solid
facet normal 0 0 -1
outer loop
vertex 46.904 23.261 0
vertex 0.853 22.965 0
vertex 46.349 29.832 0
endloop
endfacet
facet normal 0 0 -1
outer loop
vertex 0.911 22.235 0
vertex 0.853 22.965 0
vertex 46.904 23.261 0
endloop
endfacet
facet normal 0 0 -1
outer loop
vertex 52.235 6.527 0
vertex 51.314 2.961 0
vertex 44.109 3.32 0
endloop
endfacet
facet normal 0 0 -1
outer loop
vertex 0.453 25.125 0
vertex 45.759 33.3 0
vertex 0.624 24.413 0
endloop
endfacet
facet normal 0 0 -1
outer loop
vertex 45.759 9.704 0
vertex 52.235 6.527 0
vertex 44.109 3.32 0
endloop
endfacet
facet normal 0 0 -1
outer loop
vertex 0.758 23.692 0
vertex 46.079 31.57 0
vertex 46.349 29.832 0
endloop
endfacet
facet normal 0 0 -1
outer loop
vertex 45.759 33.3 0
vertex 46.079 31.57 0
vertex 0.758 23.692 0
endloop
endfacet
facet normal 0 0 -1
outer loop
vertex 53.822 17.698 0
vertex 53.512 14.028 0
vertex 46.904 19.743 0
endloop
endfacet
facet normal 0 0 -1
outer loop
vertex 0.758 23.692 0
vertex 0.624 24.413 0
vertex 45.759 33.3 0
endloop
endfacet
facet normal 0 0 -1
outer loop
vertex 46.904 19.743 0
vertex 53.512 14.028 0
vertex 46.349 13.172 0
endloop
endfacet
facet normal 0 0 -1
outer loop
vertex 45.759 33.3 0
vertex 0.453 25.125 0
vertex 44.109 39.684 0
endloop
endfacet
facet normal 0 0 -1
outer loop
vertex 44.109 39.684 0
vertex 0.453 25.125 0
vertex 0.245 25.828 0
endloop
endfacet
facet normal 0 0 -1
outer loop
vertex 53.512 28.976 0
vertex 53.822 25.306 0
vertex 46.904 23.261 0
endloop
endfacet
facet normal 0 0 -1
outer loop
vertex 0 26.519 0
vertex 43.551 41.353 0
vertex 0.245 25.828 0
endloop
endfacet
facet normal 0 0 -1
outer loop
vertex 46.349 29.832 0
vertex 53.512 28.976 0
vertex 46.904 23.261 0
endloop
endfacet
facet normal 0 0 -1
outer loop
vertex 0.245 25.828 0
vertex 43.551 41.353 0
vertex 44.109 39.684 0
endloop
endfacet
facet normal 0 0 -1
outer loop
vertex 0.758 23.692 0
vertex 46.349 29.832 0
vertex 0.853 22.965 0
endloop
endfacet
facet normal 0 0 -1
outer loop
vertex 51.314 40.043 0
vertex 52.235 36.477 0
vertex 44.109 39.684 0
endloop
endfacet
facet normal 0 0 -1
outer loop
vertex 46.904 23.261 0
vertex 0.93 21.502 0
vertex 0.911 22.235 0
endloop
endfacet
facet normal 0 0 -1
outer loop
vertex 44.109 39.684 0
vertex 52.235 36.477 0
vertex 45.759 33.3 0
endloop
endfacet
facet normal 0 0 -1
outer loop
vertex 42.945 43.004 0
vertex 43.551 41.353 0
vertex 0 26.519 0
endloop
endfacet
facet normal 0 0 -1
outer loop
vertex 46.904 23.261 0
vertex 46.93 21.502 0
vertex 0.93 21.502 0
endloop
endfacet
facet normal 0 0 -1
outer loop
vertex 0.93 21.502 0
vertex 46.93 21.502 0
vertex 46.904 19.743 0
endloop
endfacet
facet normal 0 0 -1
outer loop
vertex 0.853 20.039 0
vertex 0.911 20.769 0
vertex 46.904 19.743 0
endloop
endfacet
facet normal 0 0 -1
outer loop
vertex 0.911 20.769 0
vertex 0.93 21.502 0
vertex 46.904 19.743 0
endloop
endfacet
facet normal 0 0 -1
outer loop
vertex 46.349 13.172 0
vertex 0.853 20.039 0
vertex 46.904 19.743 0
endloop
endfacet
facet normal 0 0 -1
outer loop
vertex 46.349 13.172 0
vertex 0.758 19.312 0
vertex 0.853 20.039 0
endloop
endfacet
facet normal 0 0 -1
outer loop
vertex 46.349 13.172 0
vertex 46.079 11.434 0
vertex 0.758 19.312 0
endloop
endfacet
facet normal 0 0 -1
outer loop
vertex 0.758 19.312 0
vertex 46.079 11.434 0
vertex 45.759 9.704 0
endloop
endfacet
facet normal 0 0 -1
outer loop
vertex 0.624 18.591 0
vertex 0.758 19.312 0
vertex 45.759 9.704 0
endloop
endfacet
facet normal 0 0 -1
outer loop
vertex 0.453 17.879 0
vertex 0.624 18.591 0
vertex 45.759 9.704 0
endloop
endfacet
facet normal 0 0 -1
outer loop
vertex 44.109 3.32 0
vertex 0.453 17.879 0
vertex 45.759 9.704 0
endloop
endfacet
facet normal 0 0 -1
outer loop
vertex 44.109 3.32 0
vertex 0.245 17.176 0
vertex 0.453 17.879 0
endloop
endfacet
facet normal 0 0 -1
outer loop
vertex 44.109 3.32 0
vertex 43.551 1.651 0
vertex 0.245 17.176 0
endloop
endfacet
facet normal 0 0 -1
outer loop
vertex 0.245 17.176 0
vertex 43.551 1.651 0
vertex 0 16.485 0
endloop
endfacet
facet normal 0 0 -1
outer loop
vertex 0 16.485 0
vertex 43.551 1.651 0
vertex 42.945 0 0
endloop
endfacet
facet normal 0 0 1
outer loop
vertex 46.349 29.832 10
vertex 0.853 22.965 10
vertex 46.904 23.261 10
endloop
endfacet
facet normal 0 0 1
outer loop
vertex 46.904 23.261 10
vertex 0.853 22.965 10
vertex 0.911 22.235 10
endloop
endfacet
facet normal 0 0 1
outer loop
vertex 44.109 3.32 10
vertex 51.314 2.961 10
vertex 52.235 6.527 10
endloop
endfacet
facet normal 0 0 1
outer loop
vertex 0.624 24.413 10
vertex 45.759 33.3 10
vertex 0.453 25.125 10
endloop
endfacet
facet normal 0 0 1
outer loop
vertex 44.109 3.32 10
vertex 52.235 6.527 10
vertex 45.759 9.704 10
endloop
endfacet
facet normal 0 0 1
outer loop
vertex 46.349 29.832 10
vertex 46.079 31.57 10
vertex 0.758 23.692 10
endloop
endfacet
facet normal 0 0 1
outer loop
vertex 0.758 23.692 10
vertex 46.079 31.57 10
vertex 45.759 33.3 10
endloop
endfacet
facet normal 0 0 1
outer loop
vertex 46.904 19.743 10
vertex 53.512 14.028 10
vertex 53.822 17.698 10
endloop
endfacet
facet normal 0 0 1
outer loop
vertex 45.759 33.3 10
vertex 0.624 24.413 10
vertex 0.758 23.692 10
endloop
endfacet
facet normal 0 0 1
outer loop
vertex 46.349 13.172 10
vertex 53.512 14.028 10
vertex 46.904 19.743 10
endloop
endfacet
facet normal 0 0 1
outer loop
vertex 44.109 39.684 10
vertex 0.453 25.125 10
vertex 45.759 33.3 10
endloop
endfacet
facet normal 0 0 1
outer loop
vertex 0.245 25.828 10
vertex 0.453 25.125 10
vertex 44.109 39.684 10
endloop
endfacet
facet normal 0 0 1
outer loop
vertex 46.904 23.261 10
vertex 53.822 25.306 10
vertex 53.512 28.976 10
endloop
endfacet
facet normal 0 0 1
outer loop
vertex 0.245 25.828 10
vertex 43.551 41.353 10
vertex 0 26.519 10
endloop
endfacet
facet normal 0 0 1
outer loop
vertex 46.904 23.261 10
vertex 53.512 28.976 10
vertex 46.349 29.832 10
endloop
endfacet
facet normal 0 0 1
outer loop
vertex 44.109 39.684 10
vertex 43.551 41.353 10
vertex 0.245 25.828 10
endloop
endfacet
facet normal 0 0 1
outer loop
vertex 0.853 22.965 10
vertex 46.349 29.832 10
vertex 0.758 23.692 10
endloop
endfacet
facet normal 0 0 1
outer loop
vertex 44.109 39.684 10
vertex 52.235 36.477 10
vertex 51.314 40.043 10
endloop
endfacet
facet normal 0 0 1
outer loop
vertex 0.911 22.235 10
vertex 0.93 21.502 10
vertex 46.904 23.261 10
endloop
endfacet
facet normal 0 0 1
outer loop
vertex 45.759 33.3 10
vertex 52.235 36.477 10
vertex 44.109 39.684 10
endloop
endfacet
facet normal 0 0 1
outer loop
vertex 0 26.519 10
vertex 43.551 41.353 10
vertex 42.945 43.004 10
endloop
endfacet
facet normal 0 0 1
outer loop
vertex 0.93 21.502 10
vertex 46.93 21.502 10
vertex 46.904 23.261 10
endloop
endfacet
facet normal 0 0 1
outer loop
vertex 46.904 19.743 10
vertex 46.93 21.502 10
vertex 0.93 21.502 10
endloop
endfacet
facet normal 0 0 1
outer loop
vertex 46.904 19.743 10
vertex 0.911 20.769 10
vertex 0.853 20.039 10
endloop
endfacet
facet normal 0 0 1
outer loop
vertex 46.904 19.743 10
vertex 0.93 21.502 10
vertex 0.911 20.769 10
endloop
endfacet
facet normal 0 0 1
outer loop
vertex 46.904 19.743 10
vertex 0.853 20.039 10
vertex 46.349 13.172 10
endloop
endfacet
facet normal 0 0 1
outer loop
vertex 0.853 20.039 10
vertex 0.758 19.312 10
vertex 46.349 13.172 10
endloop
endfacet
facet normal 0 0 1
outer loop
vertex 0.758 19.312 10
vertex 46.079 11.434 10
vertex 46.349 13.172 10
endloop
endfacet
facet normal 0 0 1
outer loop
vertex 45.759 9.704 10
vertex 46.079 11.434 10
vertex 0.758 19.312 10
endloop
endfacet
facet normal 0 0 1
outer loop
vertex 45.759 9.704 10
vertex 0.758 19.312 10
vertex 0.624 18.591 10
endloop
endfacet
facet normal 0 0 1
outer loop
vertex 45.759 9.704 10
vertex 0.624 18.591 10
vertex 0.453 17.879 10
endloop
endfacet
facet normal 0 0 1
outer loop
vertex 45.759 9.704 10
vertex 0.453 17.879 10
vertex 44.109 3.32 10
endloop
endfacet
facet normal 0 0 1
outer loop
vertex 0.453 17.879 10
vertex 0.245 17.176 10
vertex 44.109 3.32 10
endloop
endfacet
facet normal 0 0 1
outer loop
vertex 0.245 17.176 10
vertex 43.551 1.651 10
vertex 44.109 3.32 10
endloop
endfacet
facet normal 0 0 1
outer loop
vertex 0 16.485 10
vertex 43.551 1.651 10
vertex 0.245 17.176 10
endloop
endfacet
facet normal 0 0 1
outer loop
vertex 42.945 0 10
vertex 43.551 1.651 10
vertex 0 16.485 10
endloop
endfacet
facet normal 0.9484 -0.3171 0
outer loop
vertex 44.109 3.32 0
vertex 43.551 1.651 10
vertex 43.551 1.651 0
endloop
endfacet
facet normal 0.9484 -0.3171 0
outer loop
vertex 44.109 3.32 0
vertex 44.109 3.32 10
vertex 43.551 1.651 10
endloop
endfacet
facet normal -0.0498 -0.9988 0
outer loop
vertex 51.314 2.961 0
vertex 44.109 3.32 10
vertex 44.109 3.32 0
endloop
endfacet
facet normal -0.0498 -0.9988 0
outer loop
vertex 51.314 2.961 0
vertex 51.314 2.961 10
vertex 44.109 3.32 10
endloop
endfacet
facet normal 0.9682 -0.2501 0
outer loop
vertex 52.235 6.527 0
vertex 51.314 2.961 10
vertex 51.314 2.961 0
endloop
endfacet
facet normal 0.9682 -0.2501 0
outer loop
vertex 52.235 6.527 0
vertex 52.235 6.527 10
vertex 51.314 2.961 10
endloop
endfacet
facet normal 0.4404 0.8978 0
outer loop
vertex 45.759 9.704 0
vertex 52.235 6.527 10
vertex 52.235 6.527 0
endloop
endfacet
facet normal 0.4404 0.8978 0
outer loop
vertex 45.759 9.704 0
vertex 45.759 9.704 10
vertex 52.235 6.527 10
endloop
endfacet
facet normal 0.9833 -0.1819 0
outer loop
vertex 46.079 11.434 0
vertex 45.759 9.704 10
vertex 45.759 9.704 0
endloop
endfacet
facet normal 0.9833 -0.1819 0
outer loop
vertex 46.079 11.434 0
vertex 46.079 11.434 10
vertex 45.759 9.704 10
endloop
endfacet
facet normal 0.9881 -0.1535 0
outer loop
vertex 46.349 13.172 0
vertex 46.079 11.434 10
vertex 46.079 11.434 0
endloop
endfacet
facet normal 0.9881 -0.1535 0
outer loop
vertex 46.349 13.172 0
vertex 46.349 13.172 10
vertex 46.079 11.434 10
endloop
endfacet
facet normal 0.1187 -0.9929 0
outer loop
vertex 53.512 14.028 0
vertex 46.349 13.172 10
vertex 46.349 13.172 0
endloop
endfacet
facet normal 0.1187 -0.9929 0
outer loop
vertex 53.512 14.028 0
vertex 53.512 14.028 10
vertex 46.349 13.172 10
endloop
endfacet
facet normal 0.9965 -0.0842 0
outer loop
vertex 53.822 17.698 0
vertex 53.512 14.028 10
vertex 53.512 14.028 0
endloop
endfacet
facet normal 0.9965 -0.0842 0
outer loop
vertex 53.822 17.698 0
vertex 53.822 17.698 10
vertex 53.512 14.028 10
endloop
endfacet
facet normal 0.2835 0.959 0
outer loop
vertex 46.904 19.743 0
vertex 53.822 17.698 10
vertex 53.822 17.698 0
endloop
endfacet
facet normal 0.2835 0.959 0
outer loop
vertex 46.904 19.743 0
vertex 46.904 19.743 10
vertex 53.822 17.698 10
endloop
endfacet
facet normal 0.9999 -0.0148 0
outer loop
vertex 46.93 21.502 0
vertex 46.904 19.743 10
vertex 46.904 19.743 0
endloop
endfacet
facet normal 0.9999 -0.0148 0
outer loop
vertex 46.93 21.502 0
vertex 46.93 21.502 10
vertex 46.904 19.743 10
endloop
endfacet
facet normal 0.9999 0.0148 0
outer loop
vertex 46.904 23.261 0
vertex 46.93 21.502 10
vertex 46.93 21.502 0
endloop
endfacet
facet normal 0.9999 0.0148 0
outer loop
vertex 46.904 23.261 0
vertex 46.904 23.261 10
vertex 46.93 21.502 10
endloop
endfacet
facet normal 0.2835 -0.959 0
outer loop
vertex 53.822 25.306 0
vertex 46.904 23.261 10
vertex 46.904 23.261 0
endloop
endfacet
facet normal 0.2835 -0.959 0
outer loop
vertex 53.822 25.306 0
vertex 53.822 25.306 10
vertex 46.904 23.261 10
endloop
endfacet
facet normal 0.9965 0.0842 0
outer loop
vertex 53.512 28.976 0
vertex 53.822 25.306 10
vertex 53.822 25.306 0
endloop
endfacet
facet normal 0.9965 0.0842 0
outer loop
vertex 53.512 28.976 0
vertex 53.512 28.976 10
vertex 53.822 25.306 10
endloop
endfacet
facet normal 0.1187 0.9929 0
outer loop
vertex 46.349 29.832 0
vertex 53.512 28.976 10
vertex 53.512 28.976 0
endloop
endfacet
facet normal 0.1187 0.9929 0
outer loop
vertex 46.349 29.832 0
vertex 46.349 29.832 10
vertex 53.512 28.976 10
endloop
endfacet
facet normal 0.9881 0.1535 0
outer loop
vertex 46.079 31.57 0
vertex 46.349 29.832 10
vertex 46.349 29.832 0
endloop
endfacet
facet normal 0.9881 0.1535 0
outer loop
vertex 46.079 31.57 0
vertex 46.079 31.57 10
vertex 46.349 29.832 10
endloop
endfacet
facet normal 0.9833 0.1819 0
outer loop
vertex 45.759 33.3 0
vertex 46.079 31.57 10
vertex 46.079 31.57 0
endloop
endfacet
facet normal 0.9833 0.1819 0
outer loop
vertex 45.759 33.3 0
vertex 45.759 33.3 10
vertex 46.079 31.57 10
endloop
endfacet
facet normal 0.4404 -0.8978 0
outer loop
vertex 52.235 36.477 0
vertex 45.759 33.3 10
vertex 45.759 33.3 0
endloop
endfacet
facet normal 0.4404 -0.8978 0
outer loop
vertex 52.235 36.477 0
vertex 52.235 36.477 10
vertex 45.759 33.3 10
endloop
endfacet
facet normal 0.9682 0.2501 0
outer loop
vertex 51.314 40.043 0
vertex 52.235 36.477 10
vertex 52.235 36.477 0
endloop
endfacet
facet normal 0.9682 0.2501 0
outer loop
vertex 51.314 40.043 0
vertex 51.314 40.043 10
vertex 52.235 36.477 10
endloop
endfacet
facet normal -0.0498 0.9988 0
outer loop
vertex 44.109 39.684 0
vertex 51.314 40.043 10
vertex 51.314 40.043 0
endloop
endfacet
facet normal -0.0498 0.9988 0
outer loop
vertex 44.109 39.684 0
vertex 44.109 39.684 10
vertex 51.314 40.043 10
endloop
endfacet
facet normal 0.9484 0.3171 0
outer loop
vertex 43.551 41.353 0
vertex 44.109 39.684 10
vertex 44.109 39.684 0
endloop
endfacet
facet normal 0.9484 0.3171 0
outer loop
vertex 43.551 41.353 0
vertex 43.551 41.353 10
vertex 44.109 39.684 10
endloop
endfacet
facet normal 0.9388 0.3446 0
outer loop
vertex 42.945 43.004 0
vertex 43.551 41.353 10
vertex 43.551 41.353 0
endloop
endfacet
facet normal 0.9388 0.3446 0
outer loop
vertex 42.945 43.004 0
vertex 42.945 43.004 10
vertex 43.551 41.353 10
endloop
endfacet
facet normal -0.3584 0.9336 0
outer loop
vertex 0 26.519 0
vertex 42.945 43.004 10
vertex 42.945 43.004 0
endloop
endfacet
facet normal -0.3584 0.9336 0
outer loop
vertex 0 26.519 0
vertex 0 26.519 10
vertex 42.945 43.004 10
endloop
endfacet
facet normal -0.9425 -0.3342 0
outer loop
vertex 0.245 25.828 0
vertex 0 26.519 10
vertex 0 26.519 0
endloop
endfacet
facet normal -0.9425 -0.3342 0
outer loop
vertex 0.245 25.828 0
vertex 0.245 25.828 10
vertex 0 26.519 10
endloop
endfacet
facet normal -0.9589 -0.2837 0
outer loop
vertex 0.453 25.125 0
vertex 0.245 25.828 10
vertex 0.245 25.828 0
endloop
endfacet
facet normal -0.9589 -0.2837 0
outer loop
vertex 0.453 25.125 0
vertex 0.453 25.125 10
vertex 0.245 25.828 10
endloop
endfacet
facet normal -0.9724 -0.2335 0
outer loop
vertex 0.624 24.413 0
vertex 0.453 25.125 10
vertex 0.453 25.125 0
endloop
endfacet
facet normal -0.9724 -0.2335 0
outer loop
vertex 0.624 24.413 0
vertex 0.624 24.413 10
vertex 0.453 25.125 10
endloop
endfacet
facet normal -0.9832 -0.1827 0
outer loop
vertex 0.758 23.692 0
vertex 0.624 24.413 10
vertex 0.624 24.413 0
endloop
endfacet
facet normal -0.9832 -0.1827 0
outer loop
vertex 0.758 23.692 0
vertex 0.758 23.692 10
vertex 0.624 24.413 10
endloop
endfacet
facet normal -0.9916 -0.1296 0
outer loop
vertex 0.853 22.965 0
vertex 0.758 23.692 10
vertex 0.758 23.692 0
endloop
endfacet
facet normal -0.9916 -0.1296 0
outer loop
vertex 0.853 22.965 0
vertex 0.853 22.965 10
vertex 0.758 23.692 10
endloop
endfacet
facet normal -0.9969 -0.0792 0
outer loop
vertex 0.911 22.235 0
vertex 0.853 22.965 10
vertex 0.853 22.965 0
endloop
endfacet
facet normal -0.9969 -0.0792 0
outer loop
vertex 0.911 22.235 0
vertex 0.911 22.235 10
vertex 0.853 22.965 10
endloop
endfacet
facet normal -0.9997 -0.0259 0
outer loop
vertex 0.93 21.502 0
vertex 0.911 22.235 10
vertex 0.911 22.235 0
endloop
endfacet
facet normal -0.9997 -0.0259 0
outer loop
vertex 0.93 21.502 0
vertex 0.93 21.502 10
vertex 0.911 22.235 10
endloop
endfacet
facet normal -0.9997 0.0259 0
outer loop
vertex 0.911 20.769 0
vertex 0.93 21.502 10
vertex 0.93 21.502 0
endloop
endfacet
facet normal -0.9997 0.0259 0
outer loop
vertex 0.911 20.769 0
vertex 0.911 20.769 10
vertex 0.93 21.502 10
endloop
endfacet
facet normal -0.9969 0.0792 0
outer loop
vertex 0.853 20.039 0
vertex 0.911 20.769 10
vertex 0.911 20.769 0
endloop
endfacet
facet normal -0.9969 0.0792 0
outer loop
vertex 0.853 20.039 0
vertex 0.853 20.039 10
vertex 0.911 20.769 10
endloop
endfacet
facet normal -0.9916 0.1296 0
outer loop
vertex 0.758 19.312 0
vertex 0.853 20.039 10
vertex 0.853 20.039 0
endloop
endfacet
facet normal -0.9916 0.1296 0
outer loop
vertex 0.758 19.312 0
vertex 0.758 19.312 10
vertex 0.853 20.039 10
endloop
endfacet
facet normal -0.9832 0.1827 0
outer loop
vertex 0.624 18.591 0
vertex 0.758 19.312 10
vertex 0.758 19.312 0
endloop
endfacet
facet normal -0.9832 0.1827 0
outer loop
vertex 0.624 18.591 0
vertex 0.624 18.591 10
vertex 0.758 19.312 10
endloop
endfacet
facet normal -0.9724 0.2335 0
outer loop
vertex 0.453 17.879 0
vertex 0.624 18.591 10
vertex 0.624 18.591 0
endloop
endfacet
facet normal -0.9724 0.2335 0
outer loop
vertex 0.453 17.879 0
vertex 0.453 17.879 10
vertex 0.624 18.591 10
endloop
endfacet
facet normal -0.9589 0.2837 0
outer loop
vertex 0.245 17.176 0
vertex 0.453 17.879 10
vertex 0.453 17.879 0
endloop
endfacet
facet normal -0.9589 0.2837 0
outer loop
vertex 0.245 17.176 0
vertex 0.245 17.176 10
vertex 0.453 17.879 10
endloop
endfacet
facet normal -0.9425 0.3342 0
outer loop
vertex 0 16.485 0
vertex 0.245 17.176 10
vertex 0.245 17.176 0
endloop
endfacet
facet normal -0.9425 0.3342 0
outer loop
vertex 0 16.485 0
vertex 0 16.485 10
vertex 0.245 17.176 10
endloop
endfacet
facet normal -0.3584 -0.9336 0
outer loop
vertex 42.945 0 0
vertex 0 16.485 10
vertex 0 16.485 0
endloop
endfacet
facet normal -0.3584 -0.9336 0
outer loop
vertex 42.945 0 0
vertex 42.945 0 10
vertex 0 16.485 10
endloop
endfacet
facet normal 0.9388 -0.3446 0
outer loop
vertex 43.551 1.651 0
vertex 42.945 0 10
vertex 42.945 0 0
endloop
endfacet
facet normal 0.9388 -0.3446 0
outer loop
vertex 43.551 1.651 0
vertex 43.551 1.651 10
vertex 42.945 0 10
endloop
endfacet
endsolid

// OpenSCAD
$fn = 32;

// ----------------------------------------------------------------------
// Gear sector: 4 teeth on 42 degrees
// ----------------------------------------------------------------------

// --- parameters (mm) ---
sector_angle = 42;        // sector angle, degrees
root_r = 60;              // root circle radius
tooth_h = 7;              // tooth height over the root circle
teeth = 4;                // number of teeth on the sector
hub_r = 14;               // hub bore radius
plate_t = 10;             // sector thickness, Z
arc_step = 3;             // sampling step of the root/hub arcs, degrees

tip_r = root_r + tooth_h;  // tip circle radius

profile = [[42.945, 0], [43.551, 1.651], [44.109, 3.32], [51.314, 2.961], [52.235, 6.527], [45.759, 9.704], [46.079, 11.434], [46.349, 13.172], [53.512, 14.028], [53.822, 17.698], [46.904, 19.743], [46.93, 21.502], [46.904, 23.261], [53.822, 25.306], [53.512, 28.976], [46.349, 29.832], [46.079, 31.57], [45.759, 33.3], [52.235, 36.477], [51.314, 40.043], [44.109, 39.684], [43.551, 41.353], [42.945, 43.004], [0, 26.519], [0.245, 25.828], [0.453, 25.125], [0.624, 24.413], [0.758, 23.692], [0.853, 22.965], [0.911, 22.235], [0.93, 21.502], [0.911, 20.769], [0.853, 20.039], [0.758, 19.312], [0.624, 18.591], [0.453, 17.879], [0.245, 17.176], [0, 16.485]];  // primary outline, 38 points, counter clockwise

// --- the one profile operation ---
linear_extrude(height = plate_t) polygon(points = profile);
